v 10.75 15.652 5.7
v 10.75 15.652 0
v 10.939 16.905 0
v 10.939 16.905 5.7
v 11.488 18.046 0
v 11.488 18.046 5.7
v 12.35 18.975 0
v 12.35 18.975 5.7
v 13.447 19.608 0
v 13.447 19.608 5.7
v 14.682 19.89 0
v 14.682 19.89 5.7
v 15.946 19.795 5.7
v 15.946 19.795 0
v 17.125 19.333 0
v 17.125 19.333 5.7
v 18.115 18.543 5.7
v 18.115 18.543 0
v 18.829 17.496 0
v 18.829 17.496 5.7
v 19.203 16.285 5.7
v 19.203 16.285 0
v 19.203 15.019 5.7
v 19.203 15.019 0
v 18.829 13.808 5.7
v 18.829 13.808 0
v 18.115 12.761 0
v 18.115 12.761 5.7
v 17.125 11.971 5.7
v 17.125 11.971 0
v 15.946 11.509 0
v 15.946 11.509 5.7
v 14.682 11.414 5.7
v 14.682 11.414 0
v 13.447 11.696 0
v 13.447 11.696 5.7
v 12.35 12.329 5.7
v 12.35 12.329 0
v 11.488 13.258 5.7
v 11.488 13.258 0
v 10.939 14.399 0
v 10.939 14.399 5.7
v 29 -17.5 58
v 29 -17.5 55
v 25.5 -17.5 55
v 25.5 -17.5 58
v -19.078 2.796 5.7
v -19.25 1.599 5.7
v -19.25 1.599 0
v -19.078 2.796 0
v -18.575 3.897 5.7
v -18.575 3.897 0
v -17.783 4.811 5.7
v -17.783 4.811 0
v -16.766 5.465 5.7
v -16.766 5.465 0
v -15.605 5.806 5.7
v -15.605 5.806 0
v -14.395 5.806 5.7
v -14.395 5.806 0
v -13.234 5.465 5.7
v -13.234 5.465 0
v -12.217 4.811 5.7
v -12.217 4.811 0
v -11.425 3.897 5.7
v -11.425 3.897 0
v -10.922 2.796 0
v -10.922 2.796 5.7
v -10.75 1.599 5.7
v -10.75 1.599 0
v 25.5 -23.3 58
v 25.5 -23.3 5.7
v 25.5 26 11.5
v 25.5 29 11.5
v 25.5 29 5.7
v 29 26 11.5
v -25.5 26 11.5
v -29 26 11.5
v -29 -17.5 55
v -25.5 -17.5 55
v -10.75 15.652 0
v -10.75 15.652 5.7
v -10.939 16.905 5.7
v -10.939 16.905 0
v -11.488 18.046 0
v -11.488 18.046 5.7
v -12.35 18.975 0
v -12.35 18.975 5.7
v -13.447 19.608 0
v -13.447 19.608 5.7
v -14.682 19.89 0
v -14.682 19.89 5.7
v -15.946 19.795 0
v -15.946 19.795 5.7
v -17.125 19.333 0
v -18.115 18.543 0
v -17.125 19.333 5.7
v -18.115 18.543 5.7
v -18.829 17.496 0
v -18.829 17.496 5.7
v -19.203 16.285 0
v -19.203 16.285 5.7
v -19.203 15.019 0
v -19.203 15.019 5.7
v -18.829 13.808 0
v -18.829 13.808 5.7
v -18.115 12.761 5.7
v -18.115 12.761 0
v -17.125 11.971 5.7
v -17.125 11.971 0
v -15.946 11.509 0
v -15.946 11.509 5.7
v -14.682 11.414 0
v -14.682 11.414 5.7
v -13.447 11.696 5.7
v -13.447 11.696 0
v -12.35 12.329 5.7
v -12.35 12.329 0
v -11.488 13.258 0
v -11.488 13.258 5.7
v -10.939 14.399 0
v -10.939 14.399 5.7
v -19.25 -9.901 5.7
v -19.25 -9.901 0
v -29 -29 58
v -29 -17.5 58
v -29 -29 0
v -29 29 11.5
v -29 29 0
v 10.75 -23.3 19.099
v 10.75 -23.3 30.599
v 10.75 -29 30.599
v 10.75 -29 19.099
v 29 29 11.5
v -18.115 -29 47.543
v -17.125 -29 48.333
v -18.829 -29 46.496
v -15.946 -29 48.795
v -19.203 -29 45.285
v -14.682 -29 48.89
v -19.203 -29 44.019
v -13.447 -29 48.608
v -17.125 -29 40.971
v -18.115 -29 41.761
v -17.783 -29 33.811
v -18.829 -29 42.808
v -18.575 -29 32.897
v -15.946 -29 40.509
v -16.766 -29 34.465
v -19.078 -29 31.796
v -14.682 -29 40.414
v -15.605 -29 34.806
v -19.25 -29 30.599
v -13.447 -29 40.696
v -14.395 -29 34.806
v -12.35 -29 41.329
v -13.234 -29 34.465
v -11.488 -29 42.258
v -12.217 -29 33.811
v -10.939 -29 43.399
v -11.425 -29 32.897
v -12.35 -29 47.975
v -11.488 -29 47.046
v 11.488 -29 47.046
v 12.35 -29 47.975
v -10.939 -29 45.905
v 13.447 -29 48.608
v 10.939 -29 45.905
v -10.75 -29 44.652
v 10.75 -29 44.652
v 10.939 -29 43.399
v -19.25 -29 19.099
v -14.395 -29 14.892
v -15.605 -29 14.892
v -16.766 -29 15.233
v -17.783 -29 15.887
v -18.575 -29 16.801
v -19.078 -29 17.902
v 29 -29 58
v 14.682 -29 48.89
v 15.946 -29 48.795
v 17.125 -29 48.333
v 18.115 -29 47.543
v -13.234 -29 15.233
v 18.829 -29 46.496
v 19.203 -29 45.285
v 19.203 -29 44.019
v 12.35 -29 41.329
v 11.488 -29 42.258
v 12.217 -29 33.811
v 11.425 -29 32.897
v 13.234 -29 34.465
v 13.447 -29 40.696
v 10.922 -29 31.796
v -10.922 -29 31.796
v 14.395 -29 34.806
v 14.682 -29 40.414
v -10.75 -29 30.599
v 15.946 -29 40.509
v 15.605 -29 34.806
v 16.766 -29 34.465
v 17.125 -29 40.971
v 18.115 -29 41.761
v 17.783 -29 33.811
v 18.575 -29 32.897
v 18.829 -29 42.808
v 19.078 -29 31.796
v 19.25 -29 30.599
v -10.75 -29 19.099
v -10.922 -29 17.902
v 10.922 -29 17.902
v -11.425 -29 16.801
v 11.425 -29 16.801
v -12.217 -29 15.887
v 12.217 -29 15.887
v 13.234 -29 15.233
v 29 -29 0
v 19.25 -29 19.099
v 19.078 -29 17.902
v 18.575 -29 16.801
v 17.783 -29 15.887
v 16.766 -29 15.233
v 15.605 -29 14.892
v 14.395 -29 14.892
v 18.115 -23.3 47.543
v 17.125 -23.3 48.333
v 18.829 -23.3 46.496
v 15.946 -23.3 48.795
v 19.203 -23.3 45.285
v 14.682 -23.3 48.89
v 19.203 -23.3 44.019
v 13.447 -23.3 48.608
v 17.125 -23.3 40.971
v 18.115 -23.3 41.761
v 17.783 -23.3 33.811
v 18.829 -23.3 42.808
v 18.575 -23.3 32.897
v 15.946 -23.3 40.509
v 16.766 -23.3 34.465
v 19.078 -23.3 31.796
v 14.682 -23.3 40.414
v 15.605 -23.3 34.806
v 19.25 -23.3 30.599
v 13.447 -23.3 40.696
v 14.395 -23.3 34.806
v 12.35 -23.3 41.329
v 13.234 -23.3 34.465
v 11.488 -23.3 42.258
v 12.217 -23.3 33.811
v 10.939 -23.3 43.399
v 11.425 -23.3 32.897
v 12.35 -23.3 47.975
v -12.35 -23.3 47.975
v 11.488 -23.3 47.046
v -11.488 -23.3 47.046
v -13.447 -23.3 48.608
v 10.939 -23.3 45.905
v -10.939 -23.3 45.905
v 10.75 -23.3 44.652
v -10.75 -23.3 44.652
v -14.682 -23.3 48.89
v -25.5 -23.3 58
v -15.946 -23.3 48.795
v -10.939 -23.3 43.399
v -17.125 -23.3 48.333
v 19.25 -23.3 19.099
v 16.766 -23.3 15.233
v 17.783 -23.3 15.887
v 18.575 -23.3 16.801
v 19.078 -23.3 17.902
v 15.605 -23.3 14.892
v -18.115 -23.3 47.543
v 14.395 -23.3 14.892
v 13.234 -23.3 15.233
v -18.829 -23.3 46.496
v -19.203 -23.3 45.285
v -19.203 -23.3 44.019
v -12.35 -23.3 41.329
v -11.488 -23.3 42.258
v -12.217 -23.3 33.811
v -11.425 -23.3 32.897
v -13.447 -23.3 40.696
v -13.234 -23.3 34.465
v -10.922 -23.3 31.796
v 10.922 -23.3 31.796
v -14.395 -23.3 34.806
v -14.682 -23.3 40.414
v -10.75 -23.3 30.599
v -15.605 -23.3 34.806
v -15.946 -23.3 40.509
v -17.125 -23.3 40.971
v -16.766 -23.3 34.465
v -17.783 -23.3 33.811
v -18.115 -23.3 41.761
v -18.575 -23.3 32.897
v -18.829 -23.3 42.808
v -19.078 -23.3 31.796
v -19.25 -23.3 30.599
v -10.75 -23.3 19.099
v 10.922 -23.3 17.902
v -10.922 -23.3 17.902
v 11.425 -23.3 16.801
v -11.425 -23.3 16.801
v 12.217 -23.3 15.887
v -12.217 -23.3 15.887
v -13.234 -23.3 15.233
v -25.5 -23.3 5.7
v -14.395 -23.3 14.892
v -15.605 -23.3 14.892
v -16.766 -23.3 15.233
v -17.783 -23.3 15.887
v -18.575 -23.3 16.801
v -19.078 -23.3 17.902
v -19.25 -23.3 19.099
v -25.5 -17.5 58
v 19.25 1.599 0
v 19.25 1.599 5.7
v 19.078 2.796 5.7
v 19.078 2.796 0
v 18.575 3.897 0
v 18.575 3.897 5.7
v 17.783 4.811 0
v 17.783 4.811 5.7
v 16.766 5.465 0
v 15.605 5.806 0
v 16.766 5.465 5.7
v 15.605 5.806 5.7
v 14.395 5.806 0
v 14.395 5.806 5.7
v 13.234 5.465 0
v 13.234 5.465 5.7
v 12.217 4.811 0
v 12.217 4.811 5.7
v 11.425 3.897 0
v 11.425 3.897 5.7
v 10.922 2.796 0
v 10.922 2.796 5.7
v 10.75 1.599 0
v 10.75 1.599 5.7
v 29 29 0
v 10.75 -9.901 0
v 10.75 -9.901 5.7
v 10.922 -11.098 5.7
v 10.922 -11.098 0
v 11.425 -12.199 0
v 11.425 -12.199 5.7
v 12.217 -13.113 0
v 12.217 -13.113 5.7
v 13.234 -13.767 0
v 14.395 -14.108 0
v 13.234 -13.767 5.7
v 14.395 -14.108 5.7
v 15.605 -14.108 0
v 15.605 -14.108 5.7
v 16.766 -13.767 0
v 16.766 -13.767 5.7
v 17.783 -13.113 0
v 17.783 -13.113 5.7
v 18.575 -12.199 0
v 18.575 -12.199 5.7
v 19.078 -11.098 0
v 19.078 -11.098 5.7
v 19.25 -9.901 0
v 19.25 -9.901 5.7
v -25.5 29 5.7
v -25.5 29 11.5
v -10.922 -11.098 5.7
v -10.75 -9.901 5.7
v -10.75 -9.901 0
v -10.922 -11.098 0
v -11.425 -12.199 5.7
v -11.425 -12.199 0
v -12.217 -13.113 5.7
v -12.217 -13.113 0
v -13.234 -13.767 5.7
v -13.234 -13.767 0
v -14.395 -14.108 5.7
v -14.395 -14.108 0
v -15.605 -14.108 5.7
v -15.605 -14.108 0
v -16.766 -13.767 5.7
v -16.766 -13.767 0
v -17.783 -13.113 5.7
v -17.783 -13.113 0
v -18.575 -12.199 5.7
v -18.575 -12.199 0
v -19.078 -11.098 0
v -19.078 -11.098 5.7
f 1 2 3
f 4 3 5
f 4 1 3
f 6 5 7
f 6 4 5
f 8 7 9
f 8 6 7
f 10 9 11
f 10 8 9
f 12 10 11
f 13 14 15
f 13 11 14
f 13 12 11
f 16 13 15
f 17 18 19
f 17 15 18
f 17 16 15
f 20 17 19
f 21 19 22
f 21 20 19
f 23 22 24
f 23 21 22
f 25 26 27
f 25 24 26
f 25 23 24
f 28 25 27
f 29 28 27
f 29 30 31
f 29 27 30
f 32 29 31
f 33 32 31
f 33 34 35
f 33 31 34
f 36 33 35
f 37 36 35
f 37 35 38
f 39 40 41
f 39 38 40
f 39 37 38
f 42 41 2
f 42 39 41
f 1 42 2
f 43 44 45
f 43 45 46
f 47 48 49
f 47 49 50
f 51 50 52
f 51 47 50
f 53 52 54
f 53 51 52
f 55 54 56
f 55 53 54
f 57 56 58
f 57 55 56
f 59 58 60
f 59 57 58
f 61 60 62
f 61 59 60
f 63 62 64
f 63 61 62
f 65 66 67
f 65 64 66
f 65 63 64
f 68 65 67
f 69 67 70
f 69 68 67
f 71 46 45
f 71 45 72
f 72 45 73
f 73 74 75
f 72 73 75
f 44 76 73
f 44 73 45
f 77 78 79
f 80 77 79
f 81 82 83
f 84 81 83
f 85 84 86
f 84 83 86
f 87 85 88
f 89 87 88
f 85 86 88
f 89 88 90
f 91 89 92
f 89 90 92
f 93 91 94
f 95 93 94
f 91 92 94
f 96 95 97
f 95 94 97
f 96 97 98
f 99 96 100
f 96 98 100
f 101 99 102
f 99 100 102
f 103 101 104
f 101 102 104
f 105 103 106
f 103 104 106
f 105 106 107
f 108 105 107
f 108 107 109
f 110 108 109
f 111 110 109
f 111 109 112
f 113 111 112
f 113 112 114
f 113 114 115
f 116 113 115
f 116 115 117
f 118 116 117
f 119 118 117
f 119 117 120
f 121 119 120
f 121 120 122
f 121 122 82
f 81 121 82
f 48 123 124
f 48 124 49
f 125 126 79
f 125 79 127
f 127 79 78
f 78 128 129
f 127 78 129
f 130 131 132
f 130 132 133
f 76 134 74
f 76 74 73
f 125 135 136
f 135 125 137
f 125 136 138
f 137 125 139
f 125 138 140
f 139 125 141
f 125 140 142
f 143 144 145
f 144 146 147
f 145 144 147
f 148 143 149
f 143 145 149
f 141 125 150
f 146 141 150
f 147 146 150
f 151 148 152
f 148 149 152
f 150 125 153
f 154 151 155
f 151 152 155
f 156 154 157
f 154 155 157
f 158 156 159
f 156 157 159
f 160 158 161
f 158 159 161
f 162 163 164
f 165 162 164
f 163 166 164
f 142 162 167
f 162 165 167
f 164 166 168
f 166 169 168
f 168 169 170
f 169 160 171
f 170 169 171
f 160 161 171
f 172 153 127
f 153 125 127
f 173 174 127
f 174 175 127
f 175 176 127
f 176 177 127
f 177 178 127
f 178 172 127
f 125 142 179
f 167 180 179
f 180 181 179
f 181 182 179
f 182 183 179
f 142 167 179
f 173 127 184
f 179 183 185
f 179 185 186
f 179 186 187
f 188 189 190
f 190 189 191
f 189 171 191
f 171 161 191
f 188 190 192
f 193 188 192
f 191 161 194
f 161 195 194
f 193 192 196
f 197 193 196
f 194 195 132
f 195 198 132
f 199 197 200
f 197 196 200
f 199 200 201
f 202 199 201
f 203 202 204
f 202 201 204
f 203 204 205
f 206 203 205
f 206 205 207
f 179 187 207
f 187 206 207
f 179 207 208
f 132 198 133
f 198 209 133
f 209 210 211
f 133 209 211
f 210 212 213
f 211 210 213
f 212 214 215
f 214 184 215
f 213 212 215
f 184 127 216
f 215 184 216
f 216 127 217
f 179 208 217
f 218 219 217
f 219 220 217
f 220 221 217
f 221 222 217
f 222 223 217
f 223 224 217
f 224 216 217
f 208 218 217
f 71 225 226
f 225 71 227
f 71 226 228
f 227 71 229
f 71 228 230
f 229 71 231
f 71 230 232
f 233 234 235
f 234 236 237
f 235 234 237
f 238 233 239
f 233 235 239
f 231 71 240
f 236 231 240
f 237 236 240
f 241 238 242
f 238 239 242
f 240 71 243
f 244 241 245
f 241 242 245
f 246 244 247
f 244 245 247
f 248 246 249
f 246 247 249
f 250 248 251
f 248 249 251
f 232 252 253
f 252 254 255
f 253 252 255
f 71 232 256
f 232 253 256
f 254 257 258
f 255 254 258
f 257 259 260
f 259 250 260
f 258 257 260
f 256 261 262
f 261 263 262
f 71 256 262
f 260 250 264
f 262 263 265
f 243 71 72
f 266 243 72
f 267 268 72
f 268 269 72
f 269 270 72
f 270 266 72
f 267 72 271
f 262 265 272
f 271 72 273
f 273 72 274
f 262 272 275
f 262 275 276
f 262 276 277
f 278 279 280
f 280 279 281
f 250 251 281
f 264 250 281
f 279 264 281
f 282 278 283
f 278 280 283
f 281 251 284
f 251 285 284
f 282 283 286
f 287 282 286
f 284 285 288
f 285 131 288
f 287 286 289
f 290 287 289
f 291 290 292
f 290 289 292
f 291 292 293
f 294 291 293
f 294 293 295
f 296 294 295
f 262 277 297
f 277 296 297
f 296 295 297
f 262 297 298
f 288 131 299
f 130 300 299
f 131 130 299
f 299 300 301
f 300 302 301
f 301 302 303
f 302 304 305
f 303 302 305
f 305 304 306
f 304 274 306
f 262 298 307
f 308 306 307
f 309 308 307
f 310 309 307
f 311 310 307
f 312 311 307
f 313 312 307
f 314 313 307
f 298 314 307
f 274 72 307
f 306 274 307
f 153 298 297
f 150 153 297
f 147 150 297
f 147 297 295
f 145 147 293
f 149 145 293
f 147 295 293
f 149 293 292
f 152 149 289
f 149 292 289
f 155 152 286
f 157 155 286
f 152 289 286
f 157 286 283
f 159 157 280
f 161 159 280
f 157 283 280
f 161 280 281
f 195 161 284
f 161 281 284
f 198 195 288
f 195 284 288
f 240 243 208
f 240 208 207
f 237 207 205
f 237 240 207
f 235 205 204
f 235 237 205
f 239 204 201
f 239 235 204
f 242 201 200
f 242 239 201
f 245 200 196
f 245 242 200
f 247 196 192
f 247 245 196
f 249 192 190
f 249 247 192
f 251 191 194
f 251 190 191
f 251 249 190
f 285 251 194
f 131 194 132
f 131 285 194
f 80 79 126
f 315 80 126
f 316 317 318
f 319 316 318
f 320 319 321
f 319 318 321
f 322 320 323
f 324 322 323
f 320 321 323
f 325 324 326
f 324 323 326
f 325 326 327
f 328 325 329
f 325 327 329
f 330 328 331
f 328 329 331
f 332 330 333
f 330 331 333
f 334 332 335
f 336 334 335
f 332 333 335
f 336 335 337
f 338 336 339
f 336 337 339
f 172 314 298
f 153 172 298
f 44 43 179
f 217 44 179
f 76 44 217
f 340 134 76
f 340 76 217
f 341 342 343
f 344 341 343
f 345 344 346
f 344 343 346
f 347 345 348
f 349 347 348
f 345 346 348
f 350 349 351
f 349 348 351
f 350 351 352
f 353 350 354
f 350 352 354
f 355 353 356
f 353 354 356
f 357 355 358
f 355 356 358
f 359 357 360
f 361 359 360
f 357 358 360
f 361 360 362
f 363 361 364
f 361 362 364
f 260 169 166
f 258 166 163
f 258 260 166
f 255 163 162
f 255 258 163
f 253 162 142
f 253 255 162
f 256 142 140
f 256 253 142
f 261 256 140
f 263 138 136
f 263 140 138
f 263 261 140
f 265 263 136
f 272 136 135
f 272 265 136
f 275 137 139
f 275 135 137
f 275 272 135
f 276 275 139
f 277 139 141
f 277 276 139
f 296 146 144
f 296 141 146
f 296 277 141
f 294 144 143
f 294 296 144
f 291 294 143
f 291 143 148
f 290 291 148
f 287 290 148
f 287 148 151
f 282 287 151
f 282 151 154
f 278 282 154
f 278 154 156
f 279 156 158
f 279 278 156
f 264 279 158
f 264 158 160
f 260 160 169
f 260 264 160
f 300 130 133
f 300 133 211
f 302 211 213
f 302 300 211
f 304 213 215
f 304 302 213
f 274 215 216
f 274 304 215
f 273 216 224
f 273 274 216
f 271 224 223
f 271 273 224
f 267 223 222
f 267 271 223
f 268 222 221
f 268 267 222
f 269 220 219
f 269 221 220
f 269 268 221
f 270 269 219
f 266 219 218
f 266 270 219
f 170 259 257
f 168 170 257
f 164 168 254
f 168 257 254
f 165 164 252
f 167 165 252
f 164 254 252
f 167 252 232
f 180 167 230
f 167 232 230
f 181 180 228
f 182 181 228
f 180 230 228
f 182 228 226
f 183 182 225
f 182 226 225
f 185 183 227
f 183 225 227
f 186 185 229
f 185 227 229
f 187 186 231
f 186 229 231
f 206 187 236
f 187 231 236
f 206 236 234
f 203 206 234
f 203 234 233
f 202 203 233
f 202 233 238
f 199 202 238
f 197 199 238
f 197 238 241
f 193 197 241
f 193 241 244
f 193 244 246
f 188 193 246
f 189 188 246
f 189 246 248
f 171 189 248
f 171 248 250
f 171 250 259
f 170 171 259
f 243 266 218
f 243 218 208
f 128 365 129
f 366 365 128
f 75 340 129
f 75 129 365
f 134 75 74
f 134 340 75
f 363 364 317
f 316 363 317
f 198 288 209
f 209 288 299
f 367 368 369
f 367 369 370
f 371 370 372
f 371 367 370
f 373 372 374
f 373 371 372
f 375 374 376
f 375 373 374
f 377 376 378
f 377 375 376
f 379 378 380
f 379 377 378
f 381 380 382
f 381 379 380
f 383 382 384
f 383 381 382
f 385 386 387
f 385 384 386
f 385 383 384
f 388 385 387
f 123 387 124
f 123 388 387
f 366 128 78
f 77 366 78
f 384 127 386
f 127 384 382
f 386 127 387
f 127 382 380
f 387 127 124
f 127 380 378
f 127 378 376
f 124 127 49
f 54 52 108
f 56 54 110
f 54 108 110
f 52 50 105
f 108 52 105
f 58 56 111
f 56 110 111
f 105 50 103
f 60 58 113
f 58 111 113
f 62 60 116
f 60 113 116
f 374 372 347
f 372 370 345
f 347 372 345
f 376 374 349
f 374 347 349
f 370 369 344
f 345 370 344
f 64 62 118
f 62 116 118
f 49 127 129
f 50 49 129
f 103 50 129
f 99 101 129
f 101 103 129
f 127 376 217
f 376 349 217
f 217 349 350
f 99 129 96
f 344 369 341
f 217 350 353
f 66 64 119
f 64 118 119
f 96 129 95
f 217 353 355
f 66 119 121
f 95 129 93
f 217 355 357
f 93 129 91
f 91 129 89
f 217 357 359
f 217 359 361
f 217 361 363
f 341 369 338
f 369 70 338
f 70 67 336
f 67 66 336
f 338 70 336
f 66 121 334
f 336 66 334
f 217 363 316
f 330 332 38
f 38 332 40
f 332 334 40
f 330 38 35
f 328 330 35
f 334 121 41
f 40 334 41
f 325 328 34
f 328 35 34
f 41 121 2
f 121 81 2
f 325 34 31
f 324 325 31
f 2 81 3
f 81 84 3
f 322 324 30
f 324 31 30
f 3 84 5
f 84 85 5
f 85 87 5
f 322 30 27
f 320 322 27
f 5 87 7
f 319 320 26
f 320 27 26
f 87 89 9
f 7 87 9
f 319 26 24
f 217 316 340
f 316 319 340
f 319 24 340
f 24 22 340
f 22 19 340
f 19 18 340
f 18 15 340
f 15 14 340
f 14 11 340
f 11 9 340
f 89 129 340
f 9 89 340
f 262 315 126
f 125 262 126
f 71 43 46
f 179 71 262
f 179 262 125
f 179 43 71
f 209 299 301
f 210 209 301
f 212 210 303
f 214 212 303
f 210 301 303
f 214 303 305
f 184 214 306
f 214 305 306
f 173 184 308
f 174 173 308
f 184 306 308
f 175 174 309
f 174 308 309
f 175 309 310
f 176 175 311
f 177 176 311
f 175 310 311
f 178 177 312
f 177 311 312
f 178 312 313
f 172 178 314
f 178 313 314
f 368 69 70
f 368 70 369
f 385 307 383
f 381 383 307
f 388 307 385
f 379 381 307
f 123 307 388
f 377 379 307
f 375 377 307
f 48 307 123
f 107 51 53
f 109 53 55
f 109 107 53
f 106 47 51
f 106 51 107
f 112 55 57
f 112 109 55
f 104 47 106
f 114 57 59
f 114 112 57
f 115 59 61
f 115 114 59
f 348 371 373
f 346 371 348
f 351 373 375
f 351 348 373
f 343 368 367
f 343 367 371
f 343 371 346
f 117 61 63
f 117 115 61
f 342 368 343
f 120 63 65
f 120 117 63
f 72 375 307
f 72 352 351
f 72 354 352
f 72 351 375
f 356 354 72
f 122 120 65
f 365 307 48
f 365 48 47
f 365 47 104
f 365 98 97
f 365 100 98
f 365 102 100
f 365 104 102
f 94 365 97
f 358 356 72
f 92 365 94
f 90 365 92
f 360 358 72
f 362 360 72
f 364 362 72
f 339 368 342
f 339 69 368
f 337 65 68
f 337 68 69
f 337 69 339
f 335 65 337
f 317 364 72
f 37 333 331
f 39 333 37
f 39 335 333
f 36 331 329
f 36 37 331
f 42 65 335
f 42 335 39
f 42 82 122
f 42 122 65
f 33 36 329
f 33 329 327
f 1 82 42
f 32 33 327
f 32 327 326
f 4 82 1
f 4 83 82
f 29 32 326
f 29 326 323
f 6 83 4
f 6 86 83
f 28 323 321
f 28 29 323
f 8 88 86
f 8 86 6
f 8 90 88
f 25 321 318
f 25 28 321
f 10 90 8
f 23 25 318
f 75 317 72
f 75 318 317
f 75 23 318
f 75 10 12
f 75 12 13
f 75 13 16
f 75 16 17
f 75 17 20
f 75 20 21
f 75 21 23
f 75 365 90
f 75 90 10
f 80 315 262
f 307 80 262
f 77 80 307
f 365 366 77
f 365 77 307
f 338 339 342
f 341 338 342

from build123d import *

# Parameters (mm, degrees)
SKETCH_1_W               = 58
SKETCH_1_H               = 58
EXTRUDE_1_DEPTH          = 5.7
SKETCH_2_W               = 58
SKETCH_2_H               = 5.7
EXTRUDE_2_DEPTH          = 58
EXTRUDE_3_DEPTH          = 3.5
SKETCH_4_R               = 4.25
CUT_EXTRUDE_1_DEPTH      = 67.462696304
MIRROR_2_COPY_1_DEPTH    = 3.5
MIRROR_2_COPY_2_SKETCH_R = 4.25
MIRROR_2_COPY_2_DEPTH    = 67.462696304
MIRROR_2_COPY_3_DEPTH    = 3.5


with BuildPart() as part:
    # 草图1 → 凸台-拉伸1 (new body)
    with BuildSketch(Plane.XY):
        Rectangle(SKETCH_1_W, SKETCH_1_H)
    extrude(amount=EXTRUDE_1_DEPTH)

    # 草图2 → 凸台-拉伸2 (add)
    with BuildSketch(Plane(origin=(0, 0, 0), x_dir=(-1, 0, 0), z_dir=(0, 0, -1))):
        with Locations((0, -26.15)):
            Rectangle(SKETCH_2_W, SKETCH_2_H)
    extrude(amount=-EXTRUDE_2_DEPTH)

    # 草图3 → 凸台-拉伸3 (add)
    with BuildSketch(Plane.ZY.offset(29)):
        Polygon((5.7, 29), (11.5, 29), (11.5, 26), (55, -17.5), (58, -17.5), (58, -23.3), (5.7, -23.3), align=None)
    extrude_3 = extrude(amount=-EXTRUDE_3_DEPTH)

    # 草图4 → 切除-拉伸1 (cut, through all)
    with BuildSketch(Plane.XY.offset(5.7)):
        with Locations((-15, 15.651970491)):
            Circle(SKETCH_4_R)
        with BuildLine():
            Line((-19.25, -9.900882272), (-19.25, 1.599117728))
            ThreePointArc((-19.25, 1.599117728), (-15, 5.849117728), (-10.75, 1.599117728))
            Line((-10.75, 1.599117728), (-10.75, -9.900882272))
            ThreePointArc((-10.75, -9.900882272), (-15, -14.150882272), (-19.25, -9.900882272))
        make_face()
    cut_extrude_1 = extrude(amount=-CUT_EXTRUDE_1_DEPTH, mode=Mode.SUBTRACT)

    # 镜向1: 凸台-拉伸3, 切除-拉伸1 across plane
    add(extrude_3.mirror(Plane(origin=(0, 0, 0), x_dir=(0, 0, 1), z_dir=(1, 0, 0))))
    add(cut_extrude_1.mirror(Plane(origin=(0, 0, 0), x_dir=(0, 0, 1), z_dir=(1, 0, 0))), mode=Mode.SUBTRACT)

    # 镜向2: 切除-拉伸1 across plane
    add(cut_extrude_1.mirror(Plane(origin=(0, -14.5, 14.5), x_dir=(0, 0.7071067811865478, 0.7071067811865472), z_dir=(0, -0.7071067811865475, 0.7071067811865477))), mode=Mode.SUBTRACT)

    # 镜向2 copy 1 sketch → 镜向2 copy 1 (add)
    with BuildSketch(Plane(origin=(29, -29, 29), x_dir=(0, 1, 0), z_dir=(1, 0, 0))):
        Polygon((5.7, 29), (11.5, 29), (11.5, 26), (55, -17.5), (58, -17.5), (58, -23.3), (5.7, -23.3), align=None)
    extrude(amount=-MIRROR_2_COPY_1_DEPTH)

    # 镜向2 copy 2 sketch → 镜向2 copy 2 (cut, through all)
    with BuildSketch(Plane(origin=(0, -23.3, 29), x_dir=(-1, 0, 0), z_dir=(0, 1, 0))):
        with Locations((-15, 15.651970491)):
            Circle(MIRROR_2_COPY_2_SKETCH_R)
        with BuildLine():
            Line((-19.25, -9.900882272), (-19.25, 1.599117728))
            ThreePointArc((-19.25, 1.599117728), (-15, 5.849117728), (-10.75, 1.599117728))
            Line((-10.75, 1.599117728), (-10.75, -9.900882272))
            ThreePointArc((-10.75, -9.900882272), (-15, -14.150882272), (-19.25, -9.900882272))
        make_face()
    extrude(amount=-MIRROR_2_COPY_2_DEPTH, mode=Mode.SUBTRACT)

    # 镜向2 copy 3 sketch → 镜向2 copy 3 (add)
    with BuildSketch(Plane(origin=(-29, -29, 29), x_dir=(0, 1, 0), z_dir=(-1, 0, 0))):
        Polygon((5.7, -29), (11.5, -29), (11.5, -26), (55, 17.5), (58, 17.5), (58, 23.3), (5.7, 23.3), align=None)
    extrude(amount=-MIRROR_2_COPY_3_DEPTH)


solid = part.part
